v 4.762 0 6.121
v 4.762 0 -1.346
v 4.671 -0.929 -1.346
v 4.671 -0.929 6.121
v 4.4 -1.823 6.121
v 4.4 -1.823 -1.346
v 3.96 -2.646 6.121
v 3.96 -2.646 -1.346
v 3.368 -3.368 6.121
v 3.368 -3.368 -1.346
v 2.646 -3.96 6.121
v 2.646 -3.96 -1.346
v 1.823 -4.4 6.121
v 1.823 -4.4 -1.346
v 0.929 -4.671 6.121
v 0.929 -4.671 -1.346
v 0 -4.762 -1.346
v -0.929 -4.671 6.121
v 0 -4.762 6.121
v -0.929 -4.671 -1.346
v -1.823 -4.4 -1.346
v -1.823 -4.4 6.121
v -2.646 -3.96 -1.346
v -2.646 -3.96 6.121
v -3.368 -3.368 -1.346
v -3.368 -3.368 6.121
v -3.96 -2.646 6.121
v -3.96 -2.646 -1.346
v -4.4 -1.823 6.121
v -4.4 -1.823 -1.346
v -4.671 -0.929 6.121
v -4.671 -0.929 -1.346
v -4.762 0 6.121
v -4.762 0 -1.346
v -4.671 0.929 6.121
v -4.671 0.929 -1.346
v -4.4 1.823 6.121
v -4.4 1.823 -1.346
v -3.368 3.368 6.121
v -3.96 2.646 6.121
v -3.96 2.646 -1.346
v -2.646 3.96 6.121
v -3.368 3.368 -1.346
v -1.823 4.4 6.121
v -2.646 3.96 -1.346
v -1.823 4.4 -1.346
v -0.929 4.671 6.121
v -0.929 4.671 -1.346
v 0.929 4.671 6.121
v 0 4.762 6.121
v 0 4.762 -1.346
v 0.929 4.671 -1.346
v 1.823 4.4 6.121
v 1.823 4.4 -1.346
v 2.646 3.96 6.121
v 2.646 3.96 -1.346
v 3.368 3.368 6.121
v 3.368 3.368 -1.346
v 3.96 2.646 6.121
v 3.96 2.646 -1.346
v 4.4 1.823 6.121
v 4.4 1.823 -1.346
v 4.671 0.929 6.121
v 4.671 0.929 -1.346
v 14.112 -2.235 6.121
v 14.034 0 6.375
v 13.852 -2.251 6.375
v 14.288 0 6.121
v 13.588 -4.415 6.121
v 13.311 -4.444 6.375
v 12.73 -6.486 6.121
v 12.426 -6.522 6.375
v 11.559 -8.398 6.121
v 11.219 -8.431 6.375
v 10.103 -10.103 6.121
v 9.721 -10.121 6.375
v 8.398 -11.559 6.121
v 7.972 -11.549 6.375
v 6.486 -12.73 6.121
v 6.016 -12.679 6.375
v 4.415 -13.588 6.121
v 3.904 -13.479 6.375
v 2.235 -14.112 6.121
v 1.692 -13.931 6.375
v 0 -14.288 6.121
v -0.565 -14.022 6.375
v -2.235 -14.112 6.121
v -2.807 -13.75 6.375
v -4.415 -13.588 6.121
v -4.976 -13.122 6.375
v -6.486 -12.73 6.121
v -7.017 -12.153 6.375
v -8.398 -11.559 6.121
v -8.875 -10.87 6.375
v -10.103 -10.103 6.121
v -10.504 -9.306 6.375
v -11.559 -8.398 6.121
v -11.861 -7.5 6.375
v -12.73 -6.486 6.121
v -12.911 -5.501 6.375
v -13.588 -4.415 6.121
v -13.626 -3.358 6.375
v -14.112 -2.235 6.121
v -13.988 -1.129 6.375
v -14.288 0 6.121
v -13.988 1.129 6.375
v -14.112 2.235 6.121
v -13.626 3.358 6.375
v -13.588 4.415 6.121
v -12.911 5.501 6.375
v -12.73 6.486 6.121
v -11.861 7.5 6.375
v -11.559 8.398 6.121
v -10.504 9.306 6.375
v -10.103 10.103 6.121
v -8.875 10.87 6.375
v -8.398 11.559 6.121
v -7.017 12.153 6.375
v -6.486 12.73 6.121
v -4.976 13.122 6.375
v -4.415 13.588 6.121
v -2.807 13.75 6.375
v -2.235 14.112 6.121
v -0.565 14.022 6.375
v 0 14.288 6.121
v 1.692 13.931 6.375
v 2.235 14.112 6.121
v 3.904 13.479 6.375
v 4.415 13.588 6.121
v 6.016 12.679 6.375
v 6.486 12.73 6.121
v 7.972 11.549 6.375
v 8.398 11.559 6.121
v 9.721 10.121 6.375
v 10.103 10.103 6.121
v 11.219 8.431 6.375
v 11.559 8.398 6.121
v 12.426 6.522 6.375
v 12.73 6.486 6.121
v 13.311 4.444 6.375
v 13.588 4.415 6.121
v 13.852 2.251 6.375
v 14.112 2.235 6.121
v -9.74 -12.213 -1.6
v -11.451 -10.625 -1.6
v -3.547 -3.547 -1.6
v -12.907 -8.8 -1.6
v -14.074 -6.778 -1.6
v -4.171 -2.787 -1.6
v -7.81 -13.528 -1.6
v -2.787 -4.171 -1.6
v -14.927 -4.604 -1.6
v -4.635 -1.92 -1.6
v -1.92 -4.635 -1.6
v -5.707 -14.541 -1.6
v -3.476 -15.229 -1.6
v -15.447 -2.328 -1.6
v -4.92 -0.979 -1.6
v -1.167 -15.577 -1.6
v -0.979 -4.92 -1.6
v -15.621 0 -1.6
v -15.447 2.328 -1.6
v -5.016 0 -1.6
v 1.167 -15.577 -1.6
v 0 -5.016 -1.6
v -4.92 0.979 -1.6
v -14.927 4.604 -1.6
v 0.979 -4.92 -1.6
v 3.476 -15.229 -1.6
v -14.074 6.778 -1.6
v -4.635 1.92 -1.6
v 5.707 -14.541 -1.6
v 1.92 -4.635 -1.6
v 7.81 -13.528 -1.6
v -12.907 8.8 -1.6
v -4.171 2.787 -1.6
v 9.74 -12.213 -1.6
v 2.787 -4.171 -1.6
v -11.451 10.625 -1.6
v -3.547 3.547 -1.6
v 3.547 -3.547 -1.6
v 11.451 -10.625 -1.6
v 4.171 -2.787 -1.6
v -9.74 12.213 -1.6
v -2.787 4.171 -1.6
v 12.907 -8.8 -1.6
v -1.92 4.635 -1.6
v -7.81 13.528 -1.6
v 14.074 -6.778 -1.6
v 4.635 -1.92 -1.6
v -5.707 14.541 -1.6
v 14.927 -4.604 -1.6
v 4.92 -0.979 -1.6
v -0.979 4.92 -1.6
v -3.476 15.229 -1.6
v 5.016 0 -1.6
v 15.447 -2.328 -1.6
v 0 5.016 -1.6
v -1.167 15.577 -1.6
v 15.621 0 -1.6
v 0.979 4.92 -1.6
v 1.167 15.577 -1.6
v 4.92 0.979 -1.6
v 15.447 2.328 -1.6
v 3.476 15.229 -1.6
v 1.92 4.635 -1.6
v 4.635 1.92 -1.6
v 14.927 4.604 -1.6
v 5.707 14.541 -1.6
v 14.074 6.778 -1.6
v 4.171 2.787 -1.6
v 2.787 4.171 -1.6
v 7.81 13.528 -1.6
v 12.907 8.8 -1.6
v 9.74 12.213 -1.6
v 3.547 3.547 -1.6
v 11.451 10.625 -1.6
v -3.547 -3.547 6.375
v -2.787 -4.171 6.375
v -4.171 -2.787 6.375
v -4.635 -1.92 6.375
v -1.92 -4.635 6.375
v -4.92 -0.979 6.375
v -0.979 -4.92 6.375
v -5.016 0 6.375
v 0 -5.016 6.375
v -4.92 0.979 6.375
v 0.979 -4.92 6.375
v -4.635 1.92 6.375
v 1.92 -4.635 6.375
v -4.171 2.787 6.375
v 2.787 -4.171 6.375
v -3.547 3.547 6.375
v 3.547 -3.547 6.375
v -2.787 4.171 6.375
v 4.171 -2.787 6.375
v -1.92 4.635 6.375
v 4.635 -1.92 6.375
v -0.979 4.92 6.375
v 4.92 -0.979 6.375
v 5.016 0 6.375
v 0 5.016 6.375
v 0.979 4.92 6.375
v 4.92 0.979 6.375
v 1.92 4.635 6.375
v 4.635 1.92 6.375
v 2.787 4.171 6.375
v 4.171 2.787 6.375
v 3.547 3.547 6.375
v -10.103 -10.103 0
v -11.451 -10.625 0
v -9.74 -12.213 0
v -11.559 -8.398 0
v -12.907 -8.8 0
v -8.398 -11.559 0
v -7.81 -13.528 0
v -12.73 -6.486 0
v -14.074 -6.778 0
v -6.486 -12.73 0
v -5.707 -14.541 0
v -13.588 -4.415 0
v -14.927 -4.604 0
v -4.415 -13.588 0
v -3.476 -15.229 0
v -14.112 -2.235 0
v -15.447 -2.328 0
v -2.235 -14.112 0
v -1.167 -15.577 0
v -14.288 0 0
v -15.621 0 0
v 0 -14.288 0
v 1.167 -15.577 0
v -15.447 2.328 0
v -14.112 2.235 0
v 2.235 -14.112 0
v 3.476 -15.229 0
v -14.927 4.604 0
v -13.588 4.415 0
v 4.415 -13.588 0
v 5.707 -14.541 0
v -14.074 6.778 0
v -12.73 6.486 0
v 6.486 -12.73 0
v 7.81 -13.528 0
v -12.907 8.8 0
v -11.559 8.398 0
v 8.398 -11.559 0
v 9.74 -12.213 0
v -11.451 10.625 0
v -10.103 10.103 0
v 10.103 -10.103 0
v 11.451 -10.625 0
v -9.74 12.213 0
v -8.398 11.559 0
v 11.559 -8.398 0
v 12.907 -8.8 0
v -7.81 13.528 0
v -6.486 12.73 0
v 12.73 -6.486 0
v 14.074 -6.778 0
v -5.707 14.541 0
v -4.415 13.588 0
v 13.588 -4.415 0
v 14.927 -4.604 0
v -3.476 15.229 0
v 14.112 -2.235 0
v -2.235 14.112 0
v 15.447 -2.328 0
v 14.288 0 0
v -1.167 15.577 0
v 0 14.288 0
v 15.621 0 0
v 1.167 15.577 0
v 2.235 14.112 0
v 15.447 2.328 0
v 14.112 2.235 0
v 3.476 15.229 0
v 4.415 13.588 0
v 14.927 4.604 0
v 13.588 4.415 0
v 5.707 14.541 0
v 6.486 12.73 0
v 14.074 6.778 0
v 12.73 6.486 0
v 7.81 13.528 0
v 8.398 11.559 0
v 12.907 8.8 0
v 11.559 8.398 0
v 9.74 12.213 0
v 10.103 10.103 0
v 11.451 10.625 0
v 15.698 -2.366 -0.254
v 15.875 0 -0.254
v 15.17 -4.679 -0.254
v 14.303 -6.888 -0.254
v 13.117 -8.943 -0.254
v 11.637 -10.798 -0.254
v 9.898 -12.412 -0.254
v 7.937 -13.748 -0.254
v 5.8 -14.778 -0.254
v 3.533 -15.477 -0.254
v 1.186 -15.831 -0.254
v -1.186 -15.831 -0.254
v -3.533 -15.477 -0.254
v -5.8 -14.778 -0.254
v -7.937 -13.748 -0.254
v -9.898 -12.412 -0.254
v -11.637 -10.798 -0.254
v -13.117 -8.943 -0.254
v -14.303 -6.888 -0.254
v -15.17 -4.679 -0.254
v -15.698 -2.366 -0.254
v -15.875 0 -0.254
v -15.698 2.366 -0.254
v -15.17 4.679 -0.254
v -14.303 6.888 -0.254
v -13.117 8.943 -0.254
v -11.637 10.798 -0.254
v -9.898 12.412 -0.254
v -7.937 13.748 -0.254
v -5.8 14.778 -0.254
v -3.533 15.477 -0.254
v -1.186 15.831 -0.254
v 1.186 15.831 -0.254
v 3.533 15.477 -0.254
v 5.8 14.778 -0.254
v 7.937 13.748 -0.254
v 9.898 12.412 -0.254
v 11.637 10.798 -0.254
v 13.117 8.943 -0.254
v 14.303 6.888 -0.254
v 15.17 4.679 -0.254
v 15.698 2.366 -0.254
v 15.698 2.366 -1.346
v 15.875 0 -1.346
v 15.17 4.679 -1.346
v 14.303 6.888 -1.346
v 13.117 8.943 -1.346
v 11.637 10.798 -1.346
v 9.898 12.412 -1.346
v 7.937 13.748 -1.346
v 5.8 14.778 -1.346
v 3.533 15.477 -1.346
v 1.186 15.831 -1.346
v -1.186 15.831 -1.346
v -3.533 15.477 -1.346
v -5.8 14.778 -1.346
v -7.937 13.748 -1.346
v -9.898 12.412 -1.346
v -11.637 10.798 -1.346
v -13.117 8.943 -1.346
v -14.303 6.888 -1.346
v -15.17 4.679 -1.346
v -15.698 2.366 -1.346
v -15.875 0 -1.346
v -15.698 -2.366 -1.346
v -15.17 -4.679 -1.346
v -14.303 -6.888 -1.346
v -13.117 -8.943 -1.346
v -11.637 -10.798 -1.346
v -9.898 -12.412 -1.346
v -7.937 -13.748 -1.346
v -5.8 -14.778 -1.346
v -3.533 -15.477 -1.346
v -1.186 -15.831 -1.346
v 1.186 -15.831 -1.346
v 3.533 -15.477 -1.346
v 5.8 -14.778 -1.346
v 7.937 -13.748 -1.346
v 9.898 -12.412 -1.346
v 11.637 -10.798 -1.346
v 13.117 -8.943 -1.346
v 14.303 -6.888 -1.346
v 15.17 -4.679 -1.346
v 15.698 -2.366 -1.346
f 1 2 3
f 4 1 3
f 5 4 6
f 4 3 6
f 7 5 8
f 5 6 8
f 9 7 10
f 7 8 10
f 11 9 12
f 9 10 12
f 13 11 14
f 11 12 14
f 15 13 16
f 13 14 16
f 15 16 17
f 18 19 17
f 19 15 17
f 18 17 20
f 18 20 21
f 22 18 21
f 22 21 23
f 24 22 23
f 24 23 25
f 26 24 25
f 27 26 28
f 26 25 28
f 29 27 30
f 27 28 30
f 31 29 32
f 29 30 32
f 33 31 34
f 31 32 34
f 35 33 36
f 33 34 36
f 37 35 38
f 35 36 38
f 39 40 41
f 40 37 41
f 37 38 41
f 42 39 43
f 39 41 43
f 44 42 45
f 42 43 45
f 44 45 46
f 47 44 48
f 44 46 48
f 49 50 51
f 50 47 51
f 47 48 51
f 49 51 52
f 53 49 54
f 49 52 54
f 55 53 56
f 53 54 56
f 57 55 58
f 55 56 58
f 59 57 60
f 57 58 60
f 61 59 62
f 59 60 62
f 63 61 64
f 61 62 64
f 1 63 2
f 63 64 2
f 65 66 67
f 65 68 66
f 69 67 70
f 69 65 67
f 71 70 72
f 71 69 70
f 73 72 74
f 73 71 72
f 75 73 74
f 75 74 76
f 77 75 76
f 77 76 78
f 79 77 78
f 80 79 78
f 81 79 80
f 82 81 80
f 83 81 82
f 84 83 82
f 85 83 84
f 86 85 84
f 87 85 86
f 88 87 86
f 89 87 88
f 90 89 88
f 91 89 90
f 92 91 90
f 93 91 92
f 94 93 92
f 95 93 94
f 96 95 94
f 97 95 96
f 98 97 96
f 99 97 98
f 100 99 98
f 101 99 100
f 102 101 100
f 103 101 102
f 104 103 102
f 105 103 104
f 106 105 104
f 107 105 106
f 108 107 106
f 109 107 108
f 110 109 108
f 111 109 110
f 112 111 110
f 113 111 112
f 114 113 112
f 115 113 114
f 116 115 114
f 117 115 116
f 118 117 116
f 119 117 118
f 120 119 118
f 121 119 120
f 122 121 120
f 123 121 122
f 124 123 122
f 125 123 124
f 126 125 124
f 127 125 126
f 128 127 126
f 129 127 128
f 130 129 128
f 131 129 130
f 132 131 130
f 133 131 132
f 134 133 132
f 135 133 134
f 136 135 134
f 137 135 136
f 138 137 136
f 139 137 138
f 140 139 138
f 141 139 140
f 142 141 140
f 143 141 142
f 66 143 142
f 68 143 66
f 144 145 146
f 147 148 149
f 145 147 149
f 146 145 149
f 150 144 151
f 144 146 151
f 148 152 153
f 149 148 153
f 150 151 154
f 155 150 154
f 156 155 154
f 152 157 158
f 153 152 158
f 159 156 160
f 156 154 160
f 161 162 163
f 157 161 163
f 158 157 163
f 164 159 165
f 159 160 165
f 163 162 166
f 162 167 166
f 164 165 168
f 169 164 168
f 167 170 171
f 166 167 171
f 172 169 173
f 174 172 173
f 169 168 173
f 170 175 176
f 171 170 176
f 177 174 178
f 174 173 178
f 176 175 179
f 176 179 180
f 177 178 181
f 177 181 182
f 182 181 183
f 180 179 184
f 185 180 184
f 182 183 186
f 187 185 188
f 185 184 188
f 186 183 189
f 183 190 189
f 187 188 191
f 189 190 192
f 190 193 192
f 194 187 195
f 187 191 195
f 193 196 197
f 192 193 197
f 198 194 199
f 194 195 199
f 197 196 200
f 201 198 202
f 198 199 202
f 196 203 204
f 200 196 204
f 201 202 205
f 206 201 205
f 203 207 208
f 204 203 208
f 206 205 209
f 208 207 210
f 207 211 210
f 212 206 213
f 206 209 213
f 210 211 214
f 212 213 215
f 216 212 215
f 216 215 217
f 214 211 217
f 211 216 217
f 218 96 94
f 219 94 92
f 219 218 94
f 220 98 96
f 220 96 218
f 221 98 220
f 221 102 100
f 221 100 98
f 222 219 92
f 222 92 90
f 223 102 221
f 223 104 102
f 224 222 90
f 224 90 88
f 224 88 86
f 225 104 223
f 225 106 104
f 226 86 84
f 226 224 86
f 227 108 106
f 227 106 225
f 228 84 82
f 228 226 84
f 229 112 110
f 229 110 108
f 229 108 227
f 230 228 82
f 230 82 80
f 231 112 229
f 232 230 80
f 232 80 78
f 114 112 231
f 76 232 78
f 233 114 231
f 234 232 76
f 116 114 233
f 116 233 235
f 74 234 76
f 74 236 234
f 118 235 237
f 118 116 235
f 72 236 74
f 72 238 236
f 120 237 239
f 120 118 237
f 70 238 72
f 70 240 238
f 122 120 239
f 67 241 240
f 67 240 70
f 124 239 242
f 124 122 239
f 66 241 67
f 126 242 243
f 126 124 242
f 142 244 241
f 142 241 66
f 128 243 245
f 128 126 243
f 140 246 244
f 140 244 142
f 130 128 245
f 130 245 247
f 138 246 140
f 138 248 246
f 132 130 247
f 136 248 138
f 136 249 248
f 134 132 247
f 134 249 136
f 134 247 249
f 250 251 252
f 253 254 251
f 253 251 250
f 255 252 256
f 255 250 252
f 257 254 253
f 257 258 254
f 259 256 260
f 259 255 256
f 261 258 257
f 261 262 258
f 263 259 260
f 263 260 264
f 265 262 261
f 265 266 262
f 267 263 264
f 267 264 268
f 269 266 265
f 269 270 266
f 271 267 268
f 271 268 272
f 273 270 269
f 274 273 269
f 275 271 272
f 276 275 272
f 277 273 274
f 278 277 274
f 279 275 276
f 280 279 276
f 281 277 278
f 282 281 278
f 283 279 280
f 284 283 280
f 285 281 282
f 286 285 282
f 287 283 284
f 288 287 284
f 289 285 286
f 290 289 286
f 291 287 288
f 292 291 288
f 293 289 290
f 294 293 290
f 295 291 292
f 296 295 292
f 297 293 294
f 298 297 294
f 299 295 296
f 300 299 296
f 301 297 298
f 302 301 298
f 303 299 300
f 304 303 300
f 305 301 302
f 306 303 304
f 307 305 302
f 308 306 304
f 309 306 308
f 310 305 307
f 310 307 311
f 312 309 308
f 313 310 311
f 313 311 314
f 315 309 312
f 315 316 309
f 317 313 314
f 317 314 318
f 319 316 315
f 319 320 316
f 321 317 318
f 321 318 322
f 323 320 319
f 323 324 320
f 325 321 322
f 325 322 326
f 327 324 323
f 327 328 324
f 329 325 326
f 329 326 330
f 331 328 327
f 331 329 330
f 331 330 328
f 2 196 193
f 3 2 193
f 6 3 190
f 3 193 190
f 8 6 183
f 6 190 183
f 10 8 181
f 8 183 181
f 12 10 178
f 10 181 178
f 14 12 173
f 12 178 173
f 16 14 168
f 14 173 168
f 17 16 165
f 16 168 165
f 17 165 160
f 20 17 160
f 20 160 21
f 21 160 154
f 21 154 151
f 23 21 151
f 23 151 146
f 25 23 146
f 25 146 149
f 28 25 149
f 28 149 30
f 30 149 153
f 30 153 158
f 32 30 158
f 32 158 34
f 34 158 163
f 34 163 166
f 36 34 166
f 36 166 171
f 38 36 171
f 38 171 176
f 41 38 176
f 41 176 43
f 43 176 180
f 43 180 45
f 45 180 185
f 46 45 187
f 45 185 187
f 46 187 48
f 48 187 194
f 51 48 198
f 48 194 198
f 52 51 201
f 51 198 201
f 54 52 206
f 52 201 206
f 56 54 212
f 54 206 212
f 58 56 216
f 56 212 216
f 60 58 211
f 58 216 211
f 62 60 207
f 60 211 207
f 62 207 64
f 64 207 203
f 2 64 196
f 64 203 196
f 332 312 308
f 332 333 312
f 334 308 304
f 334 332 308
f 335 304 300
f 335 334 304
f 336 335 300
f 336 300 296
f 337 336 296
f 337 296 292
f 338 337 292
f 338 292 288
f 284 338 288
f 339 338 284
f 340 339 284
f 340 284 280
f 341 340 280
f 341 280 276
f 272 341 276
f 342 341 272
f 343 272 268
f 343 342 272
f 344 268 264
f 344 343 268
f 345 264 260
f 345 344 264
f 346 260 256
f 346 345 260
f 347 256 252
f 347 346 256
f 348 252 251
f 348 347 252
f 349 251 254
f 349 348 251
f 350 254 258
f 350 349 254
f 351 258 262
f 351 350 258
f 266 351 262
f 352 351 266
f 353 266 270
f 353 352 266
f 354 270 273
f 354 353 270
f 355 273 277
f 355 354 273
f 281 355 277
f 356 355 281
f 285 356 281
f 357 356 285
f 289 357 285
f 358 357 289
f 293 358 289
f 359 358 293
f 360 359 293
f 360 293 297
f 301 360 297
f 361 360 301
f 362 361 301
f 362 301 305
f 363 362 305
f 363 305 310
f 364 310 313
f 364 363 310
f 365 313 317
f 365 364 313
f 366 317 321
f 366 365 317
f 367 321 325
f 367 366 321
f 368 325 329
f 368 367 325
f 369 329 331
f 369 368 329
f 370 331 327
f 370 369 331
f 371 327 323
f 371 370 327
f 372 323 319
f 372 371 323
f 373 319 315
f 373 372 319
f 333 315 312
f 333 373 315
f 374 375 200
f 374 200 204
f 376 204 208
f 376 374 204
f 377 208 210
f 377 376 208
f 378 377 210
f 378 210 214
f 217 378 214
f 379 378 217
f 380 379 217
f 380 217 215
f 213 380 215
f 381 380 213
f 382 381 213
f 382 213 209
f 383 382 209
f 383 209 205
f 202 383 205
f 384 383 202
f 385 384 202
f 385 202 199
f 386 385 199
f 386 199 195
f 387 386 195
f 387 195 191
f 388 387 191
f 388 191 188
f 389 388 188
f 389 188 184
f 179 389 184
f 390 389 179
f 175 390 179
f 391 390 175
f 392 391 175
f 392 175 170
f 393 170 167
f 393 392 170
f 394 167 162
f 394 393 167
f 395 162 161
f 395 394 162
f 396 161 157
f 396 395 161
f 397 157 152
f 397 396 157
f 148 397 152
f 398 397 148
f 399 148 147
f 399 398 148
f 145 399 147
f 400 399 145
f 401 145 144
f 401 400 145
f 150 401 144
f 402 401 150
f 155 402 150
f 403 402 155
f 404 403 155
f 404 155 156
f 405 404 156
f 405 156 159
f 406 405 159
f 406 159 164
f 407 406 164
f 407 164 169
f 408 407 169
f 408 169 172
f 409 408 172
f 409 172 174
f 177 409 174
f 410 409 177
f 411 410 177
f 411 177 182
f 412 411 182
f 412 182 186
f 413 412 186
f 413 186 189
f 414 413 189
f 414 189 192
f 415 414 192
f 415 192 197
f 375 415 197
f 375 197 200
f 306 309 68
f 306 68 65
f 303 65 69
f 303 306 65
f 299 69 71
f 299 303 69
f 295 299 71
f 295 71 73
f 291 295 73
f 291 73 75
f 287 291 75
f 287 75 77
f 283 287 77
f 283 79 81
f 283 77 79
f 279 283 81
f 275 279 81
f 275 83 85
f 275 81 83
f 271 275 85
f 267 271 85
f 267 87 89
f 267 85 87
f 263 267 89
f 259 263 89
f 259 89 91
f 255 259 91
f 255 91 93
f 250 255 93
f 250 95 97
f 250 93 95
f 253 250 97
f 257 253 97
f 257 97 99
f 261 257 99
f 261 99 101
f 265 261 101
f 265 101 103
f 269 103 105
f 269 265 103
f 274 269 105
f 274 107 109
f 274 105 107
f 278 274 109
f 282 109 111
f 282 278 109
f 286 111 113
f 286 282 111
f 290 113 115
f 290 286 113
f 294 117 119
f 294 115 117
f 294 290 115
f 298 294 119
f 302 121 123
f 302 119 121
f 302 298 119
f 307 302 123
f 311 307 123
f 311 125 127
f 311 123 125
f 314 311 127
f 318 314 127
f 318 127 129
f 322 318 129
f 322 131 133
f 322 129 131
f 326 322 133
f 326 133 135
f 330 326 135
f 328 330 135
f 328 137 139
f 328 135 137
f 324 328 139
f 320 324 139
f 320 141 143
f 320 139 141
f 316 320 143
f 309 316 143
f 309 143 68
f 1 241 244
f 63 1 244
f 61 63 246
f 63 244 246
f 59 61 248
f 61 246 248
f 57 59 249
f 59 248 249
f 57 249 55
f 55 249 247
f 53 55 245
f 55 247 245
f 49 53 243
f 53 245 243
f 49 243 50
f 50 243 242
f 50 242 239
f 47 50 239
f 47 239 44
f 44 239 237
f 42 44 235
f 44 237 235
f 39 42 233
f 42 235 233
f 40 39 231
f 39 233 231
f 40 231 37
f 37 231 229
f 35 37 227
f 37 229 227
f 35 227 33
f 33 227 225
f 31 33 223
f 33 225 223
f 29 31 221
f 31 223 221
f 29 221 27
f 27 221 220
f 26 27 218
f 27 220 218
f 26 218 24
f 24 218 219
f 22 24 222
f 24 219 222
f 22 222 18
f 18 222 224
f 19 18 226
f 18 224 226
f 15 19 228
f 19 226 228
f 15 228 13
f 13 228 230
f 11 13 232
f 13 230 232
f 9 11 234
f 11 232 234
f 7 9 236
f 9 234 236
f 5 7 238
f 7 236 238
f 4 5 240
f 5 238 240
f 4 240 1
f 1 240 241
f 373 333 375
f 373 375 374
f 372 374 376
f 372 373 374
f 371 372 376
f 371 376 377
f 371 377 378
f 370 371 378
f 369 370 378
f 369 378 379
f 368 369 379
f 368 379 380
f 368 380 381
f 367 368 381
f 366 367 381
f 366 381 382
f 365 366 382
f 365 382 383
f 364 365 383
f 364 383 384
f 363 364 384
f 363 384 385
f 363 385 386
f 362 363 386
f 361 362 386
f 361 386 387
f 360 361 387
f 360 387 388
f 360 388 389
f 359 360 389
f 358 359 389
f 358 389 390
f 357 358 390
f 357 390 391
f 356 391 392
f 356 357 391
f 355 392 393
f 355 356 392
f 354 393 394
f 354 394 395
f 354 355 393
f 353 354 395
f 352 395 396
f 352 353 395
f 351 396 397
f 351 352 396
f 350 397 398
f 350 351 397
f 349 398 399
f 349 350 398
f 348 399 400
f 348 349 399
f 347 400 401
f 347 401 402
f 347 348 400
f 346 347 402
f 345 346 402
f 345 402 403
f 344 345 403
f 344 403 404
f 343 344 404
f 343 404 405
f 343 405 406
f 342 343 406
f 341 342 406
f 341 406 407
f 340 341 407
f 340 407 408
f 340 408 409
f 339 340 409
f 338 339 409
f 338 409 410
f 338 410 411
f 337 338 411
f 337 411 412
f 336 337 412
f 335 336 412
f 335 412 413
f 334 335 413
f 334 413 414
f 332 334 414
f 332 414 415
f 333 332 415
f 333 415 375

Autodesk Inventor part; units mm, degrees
ref_plane "YZ Plane" through (0, 0, 0) normal (1, 0, 0) x (0, 1, 0)
ref_plane "XZ Plane" through (0, 0, 0) normal (0, 1, 0) x (-1, 0, 0)
ref_plane "XY Plane" through (0, 0, 0) normal (0, 0, 1) x (1, 0, 0)
sketch "Sketch1" plane through (0, 0, 0) normal (0, 0, 1) x (1, 0, 0)
  circle A0 centre (0, 0) radius 14.2875
  circle A1 centre (0, 0) radius 4.7625
  circle A2 centre (0, 0) radius 15.875
  dimension "d0" = 28.575
  dimension "d1" = 9.525
  dimension "d2" = 31.75
extrude "Extrusion1" add sketch "Sketch1" along normal blind 6.3754 contours A0
extrude "Extrusion2" add sketch "Sketch1" against normal blind 1.6002 contours A0 | A2
chamfer "Chamfer1" distance 0.254 angle 45 5 edges at (-14.2875, 0, 6.3754) (-15.875, 0, 0) (-15.875, 0, -1.6002) (-4.7625, 0, 6.3754) (-4.7625, 0, -1.6002)
properties part number "fr-6-zz (1.125 OD Version)" material "Steel"
